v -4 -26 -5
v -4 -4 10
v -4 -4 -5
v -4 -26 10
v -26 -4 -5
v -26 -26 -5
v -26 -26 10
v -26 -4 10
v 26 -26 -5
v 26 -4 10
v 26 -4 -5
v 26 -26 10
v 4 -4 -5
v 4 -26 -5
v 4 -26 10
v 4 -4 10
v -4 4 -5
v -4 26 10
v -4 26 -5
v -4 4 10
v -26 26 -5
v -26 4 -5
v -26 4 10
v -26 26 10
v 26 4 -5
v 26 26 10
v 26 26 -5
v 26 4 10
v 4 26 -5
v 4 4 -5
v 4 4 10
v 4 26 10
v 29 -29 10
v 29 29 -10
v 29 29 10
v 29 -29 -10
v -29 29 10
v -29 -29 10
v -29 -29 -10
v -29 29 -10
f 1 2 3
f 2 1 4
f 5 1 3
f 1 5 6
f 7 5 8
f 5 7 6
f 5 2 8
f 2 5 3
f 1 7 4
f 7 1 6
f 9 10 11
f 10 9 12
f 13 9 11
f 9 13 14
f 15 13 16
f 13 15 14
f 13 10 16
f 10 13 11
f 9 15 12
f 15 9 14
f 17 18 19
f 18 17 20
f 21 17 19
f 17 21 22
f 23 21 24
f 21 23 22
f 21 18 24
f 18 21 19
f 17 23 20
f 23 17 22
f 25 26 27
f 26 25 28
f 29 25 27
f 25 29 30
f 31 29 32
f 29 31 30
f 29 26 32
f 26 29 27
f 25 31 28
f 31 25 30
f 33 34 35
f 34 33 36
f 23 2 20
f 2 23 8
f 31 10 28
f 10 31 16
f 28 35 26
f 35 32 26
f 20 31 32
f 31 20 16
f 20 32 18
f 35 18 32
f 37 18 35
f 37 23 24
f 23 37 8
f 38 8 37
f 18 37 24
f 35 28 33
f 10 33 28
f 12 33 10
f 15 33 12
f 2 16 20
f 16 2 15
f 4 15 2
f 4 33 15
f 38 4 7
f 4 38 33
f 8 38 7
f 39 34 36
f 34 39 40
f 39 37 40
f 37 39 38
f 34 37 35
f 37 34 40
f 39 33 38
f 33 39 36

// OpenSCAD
$fn = 32;

// ----------------------------------------------------------------------
// Pocket plate 58 x 58 x 20
// 2 x 2 pockets 22 mm square, 15 mm deep
// ----------------------------------------------------------------------

// --- parameters (mm) ---
thickness = 20;  // plate thickness
floor_t = 5;     // material left under each pocket
pocket = 22;     // pocket side length
pitch_x = 30;    // pocket pitch along X
pitch_y = 30;    // pocket pitch along Y
cols = 2;        // pockets per row
rows = 2;        // rows of pockets

// --- derived feature positions (mm) ---
depth = thickness - floor_t;        // = 15   pocket depth, down to the floor
span_x = (cols - 1) * pitch_x;      // = 30   distance between outer pockets
span_y = (rows - 1) * pitch_y;      // = 30   distance between outer pocket rows
origin_x = -span_x / 2;             // = -15   X of the first pocket
origin_y = -span_y / 2;             // = -15   Y of the first pocket
plate = [span_x + pocket + 6, span_y + pocket + 6, thickness];  // = [58, 58, 20]   overall size: pockets plus 3 mm of wall on each side
feature_centers = [
  [origin_x + 0 * pitch_x, origin_y + 0 * pitch_y],
  [origin_x + 1 * pitch_x, origin_y + 0 * pitch_y],
  [origin_x + 0 * pitch_x, origin_y + 1 * pitch_y],
  [origin_x + 1 * pitch_x, origin_y + 1 * pitch_y]
];   // pocket centres, used verbatim by the cutter loop

// plate outline, then one pocket per centre in feature_centers
difference() {
  cube(plate, center = true);
  for (centre = feature_centers)
    translate([centre[0] - pocket / 2, centre[1] - pocket / 2, plate[2] / 2 - depth])
      cube([pocket, pocket, depth + 1]);  // centred on the declared pocket centre
}
